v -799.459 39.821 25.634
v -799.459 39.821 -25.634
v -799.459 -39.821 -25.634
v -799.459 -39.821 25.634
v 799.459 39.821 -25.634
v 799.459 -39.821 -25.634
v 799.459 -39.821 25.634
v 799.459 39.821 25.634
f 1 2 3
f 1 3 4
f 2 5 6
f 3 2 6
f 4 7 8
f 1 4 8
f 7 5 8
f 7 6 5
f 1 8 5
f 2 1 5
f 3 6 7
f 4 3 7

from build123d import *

# Parameters (mm, degrees)
F0_W          = 1090.9180641174
F0_H          = 102.4502143264
F1_DEPTH      = 63.5
F1_DEPTH_BACK = 63.5
F2_W          = 127
F2_H          = 102.4502143264
F2_R          = 47.3582146857
F3_DEPTH      = 1090.9190641174
F4_DEPTH      = 254
F5_DEPTH      = 254
F7_DEPTH      = 1598.9190641174


with BuildPart() as f1:
    # F0 (on Front) → F1 (new body, two sides)
    with BuildSketch(Plane.XZ) as f1_sk:
        Rectangle(F0_W, F0_H)
    extrude(amount=F1_DEPTH)
    extrude(f1_sk.sketch, amount=-F1_DEPTH_BACK)

    # F2 (on face) → F3 (cut, through all)
    with BuildSketch(Plane.YZ.offset(545.4590320587)):
        Rectangle(F2_W, F2_H)
        Circle(F2_R, mode=Mode.SUBTRACT)
    extrude(amount=-F3_DEPTH, mode=Mode.SUBTRACT)

    # F4 (add): a face of the model
    f4_faces = [f1.faces().sort_by_distance(p)[0] for p in [
        (545.4590320587, 0, 0),
    ]]
    extrude(f4_faces, amount=F4_DEPTH)

    # F5 (add): a face of the model
    f5_faces = [f1.faces().sort_by_distance(p)[0] for p in [
        (-545.4590320587, 0, 0),
    ]]
    extrude(f5_faces, amount=F5_DEPTH)

    # F6 (on face) → F7 (cut, through all)
    with BuildSketch(Plane.YZ.offset(799.4590320587)):
        with BuildLine():
            Line((39.8211405929, 25.6335182933), (39.8211405929, -25.6335182933))
            ThreePointArc((39.8211405929, -25.6335182933), (45.4348909069, -13.359310854), (47.3582146857, 0))
            ThreePointArc((47.3582146857, 0), (45.4348909069, 13.359310854), (39.8211405929, 25.6335182933))
        make_face()
        with BuildLine():
            ThreePointArc((-39.8211405929, 25.6335182933), (-47.3582146857, 0), (-39.8211405929, -25.6335182933))
            Line((-39.8211405929, -25.6335182933), (-39.8211405929, 25.6335182933))
        make_face()
        with BuildLine():
            Line((-39.8211405929, 25.6335182933), (39.8211405929, 25.6335182933))
            ThreePointArc((39.8211405929, 25.6335182933), (0, 47.3582146857), (-39.8211405929, 25.6335182933))
        make_face()
        with BuildLine():
            ThreePointArc((-39.8211405929, -25.6335182933), (0, -47.3582146857), (39.8211405929, -25.6335182933))
            Line((39.8211405929, -25.6335182933), (-39.8211405929, -25.6335182933))
        make_face()
    extrude(amount=-F7_DEPTH, mode=Mode.SUBTRACT)


solid = f1.part
